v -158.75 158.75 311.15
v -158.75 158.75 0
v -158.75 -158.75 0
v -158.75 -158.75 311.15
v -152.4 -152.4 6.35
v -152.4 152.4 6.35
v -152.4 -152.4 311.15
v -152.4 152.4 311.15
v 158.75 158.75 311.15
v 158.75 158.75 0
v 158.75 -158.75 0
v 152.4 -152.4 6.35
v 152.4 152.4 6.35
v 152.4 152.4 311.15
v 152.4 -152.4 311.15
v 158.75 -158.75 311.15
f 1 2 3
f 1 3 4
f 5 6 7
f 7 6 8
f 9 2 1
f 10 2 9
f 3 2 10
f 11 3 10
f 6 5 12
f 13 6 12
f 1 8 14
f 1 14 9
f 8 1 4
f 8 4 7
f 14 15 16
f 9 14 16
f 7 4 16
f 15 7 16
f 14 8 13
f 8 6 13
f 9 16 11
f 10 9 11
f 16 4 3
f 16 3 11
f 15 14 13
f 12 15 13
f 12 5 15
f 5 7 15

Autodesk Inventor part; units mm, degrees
ref_plane "YZ Plane" through (0, 0, 0) normal (1, 0, 0) x (0, 1, 0)
ref_plane "XZ Plane" through (0, 0, 0) normal (0, 1, 0) x (-1, 0, 0)
ref_plane "XY Plane" through (0, 0, 0) normal (0, 0, 1) x (1, 0, 0)
sketch "Sketch1" plane through (0, 0, 0) normal (0, 0, 1) x (1, 0, 0)
  line L0 (-152.4, -152.4) -> (152.4, -152.4)
  line L1 (152.4, -152.4) -> (152.4, 152.4)
  line L2 (152.4, 152.4) -> (-152.4, 152.4)
  line L3 (-152.4, 152.4) -> (-152.4, -152.4)
  line L4 (-152.4, -152.4) -> (152.4, 152.4) construction
  line L5 (152.4, -152.4) -> (-152.4, 152.4) construction
  point P0 (0, 0)
  dimension "d0" = 304.8
  dimension "d1" = 304.8
extrude "Extrusion1" add sketch "Sketch1" along normal blind 6.35
sketch "Sketch2" plane through (152.4, -152.4, 0) normal (1, 0, 0) x (0, 0, -1)
  line L0 (-6.35, 0) -> (-6.35, 304.8) projected
  line L1 (-6.35, 304.8) -> (-311.15, 304.8)
  line L2 (-311.15, 304.8) -> (-311.15, 0)
  line L3 (-311.15, 0) -> (-6.35, 0)
  line L4 (-6.35, 0) -> (-6.35, 304.8)
  line L5 (0, 0) -> (0, 304.8) projected
  line L6 (0, 304.8) -> (-6.35, 304.8) projected
  line L7 (-6.35, 0) -> (-6.35, 304.8) projected
  line L8 (0, 0) -> (-6.35, 0) projected
  point P0 (0, 152.4)
  dimension "d4" = 304.8
  dimension "d5" = 304.8
extrude "Extrusion2" add sketch "Sketch2" along normal blind 6.35
sketch "Sketch3" plane through (152.4, 152.4, 311.15) normal (0, 1, 0) x (1, 0, 0)
  line L0 (0, 304.8) -> (-304.8, 304.8) projected
  line L1 (0, 304.8) -> (0, 0) projected
  line L2 (0, 304.8) -> (-304.8, 304.8)
  line L3 (-304.8, 304.8) -> (-304.8, 0)
  line L4 (-304.8, 0) -> (0, 0)
  line L5 (0, 0) -> (0, 304.8)
  line L6 (-304.8, 311.15) -> (6.35, 311.15) projected
  line L7 (-304.8, 311.15) -> (-304.8, 304.8) projected
  line L8 (0, 304.8) -> (-304.8, 304.8) projected
  line L9 (0, 304.8) -> (0, 0) projected
  line L10 (0, 0) -> (6.35, 0) projected
  line L11 (6.35, 311.15) -> (6.35, 0) projected
  point P0 (-152.4, 311.15)
  dimension "d8" = 304.8
  dimension "d9" = 304.8
extrude "Extrusion3" add sketch "Sketch3" along normal blind 6.35
sketch "Sketch4" plane through (-152.4, 152.4, 6.35) normal (-1, 0, 0) x (0, 0, 1)
  line L0 (-6.35, -304.8) -> (-6.35, 6.35) projected
  line L1 (-6.35, -304.8) -> (0, -304.8) projected
  line L2 (0, 0) -> (0, -304.8) projected
  line L3 (0, 0) -> (304.8, 0) projected
  line L4 (304.8, 0) -> (304.8, 6.35) projected
  line L5 (-6.35, 6.35) -> (304.8, 6.35) projected
  line L6 (0, 0) -> (304.8, 0)
  line L7 (304.8, 0) -> (304.8, -304.8)
  line L8 (304.8, -304.8) -> (0, -304.8)
  line L9 (0, -304.8) -> (0, 0)
  point P0 (-6.35, -152.4)
  dimension "d12" = 304.8
  dimension "d13" = 304.8
extrude "Extrusion4" add sketch "Sketch4" along normal blind 6.35
sketch "Sketch5" plane through (152.4, -152.4, 6.35) normal (0, -1, 0) x (1, 0, 0)
  line L0 (6.35, -6.35) -> (-311.15, -6.35) projected
  line L1 (6.35, 304.8) -> (6.35, -6.35) projected
  line L2 (0, 304.8) -> (6.35, 304.8) projected
  line L3 (0, 304.8) -> (0, 0) projected
  line L4 (-304.8, 0) -> (0, 0) projected
  line L5 (-304.8, 0) -> (-304.8, 304.8) projected
  line L6 (-304.8, 304.8) -> (-311.15, 304.8) projected
  line L7 (-311.15, -6.35) -> (-311.15, 304.8) projected
  line L8 (-304.8, 0) -> (0, 0)
  line L9 (0, 0) -> (0, 304.8)
  line L10 (0, 304.8) -> (-304.8, 304.8)
  line L11 (-304.8, 304.8) -> (-304.8, 0)
  point P0 (-152.4, -6.35)
  dimension "d16" = 304.8
  dimension "d17" = 304.8
extrude "Extrusion5" add sketch "Sketch5" along normal blind 6.35
ref_plane "Work Plane1" through (152.4, 0, 311.15) normal (0, 1, 0) x (1, 0, 0)
ref_plane "Work Plane2" through (0, 152.4, 6.35) normal (-1, 0, 0) x (0, 0, 1)
properties part number "Robot Box" material "Wood (Birch)"
